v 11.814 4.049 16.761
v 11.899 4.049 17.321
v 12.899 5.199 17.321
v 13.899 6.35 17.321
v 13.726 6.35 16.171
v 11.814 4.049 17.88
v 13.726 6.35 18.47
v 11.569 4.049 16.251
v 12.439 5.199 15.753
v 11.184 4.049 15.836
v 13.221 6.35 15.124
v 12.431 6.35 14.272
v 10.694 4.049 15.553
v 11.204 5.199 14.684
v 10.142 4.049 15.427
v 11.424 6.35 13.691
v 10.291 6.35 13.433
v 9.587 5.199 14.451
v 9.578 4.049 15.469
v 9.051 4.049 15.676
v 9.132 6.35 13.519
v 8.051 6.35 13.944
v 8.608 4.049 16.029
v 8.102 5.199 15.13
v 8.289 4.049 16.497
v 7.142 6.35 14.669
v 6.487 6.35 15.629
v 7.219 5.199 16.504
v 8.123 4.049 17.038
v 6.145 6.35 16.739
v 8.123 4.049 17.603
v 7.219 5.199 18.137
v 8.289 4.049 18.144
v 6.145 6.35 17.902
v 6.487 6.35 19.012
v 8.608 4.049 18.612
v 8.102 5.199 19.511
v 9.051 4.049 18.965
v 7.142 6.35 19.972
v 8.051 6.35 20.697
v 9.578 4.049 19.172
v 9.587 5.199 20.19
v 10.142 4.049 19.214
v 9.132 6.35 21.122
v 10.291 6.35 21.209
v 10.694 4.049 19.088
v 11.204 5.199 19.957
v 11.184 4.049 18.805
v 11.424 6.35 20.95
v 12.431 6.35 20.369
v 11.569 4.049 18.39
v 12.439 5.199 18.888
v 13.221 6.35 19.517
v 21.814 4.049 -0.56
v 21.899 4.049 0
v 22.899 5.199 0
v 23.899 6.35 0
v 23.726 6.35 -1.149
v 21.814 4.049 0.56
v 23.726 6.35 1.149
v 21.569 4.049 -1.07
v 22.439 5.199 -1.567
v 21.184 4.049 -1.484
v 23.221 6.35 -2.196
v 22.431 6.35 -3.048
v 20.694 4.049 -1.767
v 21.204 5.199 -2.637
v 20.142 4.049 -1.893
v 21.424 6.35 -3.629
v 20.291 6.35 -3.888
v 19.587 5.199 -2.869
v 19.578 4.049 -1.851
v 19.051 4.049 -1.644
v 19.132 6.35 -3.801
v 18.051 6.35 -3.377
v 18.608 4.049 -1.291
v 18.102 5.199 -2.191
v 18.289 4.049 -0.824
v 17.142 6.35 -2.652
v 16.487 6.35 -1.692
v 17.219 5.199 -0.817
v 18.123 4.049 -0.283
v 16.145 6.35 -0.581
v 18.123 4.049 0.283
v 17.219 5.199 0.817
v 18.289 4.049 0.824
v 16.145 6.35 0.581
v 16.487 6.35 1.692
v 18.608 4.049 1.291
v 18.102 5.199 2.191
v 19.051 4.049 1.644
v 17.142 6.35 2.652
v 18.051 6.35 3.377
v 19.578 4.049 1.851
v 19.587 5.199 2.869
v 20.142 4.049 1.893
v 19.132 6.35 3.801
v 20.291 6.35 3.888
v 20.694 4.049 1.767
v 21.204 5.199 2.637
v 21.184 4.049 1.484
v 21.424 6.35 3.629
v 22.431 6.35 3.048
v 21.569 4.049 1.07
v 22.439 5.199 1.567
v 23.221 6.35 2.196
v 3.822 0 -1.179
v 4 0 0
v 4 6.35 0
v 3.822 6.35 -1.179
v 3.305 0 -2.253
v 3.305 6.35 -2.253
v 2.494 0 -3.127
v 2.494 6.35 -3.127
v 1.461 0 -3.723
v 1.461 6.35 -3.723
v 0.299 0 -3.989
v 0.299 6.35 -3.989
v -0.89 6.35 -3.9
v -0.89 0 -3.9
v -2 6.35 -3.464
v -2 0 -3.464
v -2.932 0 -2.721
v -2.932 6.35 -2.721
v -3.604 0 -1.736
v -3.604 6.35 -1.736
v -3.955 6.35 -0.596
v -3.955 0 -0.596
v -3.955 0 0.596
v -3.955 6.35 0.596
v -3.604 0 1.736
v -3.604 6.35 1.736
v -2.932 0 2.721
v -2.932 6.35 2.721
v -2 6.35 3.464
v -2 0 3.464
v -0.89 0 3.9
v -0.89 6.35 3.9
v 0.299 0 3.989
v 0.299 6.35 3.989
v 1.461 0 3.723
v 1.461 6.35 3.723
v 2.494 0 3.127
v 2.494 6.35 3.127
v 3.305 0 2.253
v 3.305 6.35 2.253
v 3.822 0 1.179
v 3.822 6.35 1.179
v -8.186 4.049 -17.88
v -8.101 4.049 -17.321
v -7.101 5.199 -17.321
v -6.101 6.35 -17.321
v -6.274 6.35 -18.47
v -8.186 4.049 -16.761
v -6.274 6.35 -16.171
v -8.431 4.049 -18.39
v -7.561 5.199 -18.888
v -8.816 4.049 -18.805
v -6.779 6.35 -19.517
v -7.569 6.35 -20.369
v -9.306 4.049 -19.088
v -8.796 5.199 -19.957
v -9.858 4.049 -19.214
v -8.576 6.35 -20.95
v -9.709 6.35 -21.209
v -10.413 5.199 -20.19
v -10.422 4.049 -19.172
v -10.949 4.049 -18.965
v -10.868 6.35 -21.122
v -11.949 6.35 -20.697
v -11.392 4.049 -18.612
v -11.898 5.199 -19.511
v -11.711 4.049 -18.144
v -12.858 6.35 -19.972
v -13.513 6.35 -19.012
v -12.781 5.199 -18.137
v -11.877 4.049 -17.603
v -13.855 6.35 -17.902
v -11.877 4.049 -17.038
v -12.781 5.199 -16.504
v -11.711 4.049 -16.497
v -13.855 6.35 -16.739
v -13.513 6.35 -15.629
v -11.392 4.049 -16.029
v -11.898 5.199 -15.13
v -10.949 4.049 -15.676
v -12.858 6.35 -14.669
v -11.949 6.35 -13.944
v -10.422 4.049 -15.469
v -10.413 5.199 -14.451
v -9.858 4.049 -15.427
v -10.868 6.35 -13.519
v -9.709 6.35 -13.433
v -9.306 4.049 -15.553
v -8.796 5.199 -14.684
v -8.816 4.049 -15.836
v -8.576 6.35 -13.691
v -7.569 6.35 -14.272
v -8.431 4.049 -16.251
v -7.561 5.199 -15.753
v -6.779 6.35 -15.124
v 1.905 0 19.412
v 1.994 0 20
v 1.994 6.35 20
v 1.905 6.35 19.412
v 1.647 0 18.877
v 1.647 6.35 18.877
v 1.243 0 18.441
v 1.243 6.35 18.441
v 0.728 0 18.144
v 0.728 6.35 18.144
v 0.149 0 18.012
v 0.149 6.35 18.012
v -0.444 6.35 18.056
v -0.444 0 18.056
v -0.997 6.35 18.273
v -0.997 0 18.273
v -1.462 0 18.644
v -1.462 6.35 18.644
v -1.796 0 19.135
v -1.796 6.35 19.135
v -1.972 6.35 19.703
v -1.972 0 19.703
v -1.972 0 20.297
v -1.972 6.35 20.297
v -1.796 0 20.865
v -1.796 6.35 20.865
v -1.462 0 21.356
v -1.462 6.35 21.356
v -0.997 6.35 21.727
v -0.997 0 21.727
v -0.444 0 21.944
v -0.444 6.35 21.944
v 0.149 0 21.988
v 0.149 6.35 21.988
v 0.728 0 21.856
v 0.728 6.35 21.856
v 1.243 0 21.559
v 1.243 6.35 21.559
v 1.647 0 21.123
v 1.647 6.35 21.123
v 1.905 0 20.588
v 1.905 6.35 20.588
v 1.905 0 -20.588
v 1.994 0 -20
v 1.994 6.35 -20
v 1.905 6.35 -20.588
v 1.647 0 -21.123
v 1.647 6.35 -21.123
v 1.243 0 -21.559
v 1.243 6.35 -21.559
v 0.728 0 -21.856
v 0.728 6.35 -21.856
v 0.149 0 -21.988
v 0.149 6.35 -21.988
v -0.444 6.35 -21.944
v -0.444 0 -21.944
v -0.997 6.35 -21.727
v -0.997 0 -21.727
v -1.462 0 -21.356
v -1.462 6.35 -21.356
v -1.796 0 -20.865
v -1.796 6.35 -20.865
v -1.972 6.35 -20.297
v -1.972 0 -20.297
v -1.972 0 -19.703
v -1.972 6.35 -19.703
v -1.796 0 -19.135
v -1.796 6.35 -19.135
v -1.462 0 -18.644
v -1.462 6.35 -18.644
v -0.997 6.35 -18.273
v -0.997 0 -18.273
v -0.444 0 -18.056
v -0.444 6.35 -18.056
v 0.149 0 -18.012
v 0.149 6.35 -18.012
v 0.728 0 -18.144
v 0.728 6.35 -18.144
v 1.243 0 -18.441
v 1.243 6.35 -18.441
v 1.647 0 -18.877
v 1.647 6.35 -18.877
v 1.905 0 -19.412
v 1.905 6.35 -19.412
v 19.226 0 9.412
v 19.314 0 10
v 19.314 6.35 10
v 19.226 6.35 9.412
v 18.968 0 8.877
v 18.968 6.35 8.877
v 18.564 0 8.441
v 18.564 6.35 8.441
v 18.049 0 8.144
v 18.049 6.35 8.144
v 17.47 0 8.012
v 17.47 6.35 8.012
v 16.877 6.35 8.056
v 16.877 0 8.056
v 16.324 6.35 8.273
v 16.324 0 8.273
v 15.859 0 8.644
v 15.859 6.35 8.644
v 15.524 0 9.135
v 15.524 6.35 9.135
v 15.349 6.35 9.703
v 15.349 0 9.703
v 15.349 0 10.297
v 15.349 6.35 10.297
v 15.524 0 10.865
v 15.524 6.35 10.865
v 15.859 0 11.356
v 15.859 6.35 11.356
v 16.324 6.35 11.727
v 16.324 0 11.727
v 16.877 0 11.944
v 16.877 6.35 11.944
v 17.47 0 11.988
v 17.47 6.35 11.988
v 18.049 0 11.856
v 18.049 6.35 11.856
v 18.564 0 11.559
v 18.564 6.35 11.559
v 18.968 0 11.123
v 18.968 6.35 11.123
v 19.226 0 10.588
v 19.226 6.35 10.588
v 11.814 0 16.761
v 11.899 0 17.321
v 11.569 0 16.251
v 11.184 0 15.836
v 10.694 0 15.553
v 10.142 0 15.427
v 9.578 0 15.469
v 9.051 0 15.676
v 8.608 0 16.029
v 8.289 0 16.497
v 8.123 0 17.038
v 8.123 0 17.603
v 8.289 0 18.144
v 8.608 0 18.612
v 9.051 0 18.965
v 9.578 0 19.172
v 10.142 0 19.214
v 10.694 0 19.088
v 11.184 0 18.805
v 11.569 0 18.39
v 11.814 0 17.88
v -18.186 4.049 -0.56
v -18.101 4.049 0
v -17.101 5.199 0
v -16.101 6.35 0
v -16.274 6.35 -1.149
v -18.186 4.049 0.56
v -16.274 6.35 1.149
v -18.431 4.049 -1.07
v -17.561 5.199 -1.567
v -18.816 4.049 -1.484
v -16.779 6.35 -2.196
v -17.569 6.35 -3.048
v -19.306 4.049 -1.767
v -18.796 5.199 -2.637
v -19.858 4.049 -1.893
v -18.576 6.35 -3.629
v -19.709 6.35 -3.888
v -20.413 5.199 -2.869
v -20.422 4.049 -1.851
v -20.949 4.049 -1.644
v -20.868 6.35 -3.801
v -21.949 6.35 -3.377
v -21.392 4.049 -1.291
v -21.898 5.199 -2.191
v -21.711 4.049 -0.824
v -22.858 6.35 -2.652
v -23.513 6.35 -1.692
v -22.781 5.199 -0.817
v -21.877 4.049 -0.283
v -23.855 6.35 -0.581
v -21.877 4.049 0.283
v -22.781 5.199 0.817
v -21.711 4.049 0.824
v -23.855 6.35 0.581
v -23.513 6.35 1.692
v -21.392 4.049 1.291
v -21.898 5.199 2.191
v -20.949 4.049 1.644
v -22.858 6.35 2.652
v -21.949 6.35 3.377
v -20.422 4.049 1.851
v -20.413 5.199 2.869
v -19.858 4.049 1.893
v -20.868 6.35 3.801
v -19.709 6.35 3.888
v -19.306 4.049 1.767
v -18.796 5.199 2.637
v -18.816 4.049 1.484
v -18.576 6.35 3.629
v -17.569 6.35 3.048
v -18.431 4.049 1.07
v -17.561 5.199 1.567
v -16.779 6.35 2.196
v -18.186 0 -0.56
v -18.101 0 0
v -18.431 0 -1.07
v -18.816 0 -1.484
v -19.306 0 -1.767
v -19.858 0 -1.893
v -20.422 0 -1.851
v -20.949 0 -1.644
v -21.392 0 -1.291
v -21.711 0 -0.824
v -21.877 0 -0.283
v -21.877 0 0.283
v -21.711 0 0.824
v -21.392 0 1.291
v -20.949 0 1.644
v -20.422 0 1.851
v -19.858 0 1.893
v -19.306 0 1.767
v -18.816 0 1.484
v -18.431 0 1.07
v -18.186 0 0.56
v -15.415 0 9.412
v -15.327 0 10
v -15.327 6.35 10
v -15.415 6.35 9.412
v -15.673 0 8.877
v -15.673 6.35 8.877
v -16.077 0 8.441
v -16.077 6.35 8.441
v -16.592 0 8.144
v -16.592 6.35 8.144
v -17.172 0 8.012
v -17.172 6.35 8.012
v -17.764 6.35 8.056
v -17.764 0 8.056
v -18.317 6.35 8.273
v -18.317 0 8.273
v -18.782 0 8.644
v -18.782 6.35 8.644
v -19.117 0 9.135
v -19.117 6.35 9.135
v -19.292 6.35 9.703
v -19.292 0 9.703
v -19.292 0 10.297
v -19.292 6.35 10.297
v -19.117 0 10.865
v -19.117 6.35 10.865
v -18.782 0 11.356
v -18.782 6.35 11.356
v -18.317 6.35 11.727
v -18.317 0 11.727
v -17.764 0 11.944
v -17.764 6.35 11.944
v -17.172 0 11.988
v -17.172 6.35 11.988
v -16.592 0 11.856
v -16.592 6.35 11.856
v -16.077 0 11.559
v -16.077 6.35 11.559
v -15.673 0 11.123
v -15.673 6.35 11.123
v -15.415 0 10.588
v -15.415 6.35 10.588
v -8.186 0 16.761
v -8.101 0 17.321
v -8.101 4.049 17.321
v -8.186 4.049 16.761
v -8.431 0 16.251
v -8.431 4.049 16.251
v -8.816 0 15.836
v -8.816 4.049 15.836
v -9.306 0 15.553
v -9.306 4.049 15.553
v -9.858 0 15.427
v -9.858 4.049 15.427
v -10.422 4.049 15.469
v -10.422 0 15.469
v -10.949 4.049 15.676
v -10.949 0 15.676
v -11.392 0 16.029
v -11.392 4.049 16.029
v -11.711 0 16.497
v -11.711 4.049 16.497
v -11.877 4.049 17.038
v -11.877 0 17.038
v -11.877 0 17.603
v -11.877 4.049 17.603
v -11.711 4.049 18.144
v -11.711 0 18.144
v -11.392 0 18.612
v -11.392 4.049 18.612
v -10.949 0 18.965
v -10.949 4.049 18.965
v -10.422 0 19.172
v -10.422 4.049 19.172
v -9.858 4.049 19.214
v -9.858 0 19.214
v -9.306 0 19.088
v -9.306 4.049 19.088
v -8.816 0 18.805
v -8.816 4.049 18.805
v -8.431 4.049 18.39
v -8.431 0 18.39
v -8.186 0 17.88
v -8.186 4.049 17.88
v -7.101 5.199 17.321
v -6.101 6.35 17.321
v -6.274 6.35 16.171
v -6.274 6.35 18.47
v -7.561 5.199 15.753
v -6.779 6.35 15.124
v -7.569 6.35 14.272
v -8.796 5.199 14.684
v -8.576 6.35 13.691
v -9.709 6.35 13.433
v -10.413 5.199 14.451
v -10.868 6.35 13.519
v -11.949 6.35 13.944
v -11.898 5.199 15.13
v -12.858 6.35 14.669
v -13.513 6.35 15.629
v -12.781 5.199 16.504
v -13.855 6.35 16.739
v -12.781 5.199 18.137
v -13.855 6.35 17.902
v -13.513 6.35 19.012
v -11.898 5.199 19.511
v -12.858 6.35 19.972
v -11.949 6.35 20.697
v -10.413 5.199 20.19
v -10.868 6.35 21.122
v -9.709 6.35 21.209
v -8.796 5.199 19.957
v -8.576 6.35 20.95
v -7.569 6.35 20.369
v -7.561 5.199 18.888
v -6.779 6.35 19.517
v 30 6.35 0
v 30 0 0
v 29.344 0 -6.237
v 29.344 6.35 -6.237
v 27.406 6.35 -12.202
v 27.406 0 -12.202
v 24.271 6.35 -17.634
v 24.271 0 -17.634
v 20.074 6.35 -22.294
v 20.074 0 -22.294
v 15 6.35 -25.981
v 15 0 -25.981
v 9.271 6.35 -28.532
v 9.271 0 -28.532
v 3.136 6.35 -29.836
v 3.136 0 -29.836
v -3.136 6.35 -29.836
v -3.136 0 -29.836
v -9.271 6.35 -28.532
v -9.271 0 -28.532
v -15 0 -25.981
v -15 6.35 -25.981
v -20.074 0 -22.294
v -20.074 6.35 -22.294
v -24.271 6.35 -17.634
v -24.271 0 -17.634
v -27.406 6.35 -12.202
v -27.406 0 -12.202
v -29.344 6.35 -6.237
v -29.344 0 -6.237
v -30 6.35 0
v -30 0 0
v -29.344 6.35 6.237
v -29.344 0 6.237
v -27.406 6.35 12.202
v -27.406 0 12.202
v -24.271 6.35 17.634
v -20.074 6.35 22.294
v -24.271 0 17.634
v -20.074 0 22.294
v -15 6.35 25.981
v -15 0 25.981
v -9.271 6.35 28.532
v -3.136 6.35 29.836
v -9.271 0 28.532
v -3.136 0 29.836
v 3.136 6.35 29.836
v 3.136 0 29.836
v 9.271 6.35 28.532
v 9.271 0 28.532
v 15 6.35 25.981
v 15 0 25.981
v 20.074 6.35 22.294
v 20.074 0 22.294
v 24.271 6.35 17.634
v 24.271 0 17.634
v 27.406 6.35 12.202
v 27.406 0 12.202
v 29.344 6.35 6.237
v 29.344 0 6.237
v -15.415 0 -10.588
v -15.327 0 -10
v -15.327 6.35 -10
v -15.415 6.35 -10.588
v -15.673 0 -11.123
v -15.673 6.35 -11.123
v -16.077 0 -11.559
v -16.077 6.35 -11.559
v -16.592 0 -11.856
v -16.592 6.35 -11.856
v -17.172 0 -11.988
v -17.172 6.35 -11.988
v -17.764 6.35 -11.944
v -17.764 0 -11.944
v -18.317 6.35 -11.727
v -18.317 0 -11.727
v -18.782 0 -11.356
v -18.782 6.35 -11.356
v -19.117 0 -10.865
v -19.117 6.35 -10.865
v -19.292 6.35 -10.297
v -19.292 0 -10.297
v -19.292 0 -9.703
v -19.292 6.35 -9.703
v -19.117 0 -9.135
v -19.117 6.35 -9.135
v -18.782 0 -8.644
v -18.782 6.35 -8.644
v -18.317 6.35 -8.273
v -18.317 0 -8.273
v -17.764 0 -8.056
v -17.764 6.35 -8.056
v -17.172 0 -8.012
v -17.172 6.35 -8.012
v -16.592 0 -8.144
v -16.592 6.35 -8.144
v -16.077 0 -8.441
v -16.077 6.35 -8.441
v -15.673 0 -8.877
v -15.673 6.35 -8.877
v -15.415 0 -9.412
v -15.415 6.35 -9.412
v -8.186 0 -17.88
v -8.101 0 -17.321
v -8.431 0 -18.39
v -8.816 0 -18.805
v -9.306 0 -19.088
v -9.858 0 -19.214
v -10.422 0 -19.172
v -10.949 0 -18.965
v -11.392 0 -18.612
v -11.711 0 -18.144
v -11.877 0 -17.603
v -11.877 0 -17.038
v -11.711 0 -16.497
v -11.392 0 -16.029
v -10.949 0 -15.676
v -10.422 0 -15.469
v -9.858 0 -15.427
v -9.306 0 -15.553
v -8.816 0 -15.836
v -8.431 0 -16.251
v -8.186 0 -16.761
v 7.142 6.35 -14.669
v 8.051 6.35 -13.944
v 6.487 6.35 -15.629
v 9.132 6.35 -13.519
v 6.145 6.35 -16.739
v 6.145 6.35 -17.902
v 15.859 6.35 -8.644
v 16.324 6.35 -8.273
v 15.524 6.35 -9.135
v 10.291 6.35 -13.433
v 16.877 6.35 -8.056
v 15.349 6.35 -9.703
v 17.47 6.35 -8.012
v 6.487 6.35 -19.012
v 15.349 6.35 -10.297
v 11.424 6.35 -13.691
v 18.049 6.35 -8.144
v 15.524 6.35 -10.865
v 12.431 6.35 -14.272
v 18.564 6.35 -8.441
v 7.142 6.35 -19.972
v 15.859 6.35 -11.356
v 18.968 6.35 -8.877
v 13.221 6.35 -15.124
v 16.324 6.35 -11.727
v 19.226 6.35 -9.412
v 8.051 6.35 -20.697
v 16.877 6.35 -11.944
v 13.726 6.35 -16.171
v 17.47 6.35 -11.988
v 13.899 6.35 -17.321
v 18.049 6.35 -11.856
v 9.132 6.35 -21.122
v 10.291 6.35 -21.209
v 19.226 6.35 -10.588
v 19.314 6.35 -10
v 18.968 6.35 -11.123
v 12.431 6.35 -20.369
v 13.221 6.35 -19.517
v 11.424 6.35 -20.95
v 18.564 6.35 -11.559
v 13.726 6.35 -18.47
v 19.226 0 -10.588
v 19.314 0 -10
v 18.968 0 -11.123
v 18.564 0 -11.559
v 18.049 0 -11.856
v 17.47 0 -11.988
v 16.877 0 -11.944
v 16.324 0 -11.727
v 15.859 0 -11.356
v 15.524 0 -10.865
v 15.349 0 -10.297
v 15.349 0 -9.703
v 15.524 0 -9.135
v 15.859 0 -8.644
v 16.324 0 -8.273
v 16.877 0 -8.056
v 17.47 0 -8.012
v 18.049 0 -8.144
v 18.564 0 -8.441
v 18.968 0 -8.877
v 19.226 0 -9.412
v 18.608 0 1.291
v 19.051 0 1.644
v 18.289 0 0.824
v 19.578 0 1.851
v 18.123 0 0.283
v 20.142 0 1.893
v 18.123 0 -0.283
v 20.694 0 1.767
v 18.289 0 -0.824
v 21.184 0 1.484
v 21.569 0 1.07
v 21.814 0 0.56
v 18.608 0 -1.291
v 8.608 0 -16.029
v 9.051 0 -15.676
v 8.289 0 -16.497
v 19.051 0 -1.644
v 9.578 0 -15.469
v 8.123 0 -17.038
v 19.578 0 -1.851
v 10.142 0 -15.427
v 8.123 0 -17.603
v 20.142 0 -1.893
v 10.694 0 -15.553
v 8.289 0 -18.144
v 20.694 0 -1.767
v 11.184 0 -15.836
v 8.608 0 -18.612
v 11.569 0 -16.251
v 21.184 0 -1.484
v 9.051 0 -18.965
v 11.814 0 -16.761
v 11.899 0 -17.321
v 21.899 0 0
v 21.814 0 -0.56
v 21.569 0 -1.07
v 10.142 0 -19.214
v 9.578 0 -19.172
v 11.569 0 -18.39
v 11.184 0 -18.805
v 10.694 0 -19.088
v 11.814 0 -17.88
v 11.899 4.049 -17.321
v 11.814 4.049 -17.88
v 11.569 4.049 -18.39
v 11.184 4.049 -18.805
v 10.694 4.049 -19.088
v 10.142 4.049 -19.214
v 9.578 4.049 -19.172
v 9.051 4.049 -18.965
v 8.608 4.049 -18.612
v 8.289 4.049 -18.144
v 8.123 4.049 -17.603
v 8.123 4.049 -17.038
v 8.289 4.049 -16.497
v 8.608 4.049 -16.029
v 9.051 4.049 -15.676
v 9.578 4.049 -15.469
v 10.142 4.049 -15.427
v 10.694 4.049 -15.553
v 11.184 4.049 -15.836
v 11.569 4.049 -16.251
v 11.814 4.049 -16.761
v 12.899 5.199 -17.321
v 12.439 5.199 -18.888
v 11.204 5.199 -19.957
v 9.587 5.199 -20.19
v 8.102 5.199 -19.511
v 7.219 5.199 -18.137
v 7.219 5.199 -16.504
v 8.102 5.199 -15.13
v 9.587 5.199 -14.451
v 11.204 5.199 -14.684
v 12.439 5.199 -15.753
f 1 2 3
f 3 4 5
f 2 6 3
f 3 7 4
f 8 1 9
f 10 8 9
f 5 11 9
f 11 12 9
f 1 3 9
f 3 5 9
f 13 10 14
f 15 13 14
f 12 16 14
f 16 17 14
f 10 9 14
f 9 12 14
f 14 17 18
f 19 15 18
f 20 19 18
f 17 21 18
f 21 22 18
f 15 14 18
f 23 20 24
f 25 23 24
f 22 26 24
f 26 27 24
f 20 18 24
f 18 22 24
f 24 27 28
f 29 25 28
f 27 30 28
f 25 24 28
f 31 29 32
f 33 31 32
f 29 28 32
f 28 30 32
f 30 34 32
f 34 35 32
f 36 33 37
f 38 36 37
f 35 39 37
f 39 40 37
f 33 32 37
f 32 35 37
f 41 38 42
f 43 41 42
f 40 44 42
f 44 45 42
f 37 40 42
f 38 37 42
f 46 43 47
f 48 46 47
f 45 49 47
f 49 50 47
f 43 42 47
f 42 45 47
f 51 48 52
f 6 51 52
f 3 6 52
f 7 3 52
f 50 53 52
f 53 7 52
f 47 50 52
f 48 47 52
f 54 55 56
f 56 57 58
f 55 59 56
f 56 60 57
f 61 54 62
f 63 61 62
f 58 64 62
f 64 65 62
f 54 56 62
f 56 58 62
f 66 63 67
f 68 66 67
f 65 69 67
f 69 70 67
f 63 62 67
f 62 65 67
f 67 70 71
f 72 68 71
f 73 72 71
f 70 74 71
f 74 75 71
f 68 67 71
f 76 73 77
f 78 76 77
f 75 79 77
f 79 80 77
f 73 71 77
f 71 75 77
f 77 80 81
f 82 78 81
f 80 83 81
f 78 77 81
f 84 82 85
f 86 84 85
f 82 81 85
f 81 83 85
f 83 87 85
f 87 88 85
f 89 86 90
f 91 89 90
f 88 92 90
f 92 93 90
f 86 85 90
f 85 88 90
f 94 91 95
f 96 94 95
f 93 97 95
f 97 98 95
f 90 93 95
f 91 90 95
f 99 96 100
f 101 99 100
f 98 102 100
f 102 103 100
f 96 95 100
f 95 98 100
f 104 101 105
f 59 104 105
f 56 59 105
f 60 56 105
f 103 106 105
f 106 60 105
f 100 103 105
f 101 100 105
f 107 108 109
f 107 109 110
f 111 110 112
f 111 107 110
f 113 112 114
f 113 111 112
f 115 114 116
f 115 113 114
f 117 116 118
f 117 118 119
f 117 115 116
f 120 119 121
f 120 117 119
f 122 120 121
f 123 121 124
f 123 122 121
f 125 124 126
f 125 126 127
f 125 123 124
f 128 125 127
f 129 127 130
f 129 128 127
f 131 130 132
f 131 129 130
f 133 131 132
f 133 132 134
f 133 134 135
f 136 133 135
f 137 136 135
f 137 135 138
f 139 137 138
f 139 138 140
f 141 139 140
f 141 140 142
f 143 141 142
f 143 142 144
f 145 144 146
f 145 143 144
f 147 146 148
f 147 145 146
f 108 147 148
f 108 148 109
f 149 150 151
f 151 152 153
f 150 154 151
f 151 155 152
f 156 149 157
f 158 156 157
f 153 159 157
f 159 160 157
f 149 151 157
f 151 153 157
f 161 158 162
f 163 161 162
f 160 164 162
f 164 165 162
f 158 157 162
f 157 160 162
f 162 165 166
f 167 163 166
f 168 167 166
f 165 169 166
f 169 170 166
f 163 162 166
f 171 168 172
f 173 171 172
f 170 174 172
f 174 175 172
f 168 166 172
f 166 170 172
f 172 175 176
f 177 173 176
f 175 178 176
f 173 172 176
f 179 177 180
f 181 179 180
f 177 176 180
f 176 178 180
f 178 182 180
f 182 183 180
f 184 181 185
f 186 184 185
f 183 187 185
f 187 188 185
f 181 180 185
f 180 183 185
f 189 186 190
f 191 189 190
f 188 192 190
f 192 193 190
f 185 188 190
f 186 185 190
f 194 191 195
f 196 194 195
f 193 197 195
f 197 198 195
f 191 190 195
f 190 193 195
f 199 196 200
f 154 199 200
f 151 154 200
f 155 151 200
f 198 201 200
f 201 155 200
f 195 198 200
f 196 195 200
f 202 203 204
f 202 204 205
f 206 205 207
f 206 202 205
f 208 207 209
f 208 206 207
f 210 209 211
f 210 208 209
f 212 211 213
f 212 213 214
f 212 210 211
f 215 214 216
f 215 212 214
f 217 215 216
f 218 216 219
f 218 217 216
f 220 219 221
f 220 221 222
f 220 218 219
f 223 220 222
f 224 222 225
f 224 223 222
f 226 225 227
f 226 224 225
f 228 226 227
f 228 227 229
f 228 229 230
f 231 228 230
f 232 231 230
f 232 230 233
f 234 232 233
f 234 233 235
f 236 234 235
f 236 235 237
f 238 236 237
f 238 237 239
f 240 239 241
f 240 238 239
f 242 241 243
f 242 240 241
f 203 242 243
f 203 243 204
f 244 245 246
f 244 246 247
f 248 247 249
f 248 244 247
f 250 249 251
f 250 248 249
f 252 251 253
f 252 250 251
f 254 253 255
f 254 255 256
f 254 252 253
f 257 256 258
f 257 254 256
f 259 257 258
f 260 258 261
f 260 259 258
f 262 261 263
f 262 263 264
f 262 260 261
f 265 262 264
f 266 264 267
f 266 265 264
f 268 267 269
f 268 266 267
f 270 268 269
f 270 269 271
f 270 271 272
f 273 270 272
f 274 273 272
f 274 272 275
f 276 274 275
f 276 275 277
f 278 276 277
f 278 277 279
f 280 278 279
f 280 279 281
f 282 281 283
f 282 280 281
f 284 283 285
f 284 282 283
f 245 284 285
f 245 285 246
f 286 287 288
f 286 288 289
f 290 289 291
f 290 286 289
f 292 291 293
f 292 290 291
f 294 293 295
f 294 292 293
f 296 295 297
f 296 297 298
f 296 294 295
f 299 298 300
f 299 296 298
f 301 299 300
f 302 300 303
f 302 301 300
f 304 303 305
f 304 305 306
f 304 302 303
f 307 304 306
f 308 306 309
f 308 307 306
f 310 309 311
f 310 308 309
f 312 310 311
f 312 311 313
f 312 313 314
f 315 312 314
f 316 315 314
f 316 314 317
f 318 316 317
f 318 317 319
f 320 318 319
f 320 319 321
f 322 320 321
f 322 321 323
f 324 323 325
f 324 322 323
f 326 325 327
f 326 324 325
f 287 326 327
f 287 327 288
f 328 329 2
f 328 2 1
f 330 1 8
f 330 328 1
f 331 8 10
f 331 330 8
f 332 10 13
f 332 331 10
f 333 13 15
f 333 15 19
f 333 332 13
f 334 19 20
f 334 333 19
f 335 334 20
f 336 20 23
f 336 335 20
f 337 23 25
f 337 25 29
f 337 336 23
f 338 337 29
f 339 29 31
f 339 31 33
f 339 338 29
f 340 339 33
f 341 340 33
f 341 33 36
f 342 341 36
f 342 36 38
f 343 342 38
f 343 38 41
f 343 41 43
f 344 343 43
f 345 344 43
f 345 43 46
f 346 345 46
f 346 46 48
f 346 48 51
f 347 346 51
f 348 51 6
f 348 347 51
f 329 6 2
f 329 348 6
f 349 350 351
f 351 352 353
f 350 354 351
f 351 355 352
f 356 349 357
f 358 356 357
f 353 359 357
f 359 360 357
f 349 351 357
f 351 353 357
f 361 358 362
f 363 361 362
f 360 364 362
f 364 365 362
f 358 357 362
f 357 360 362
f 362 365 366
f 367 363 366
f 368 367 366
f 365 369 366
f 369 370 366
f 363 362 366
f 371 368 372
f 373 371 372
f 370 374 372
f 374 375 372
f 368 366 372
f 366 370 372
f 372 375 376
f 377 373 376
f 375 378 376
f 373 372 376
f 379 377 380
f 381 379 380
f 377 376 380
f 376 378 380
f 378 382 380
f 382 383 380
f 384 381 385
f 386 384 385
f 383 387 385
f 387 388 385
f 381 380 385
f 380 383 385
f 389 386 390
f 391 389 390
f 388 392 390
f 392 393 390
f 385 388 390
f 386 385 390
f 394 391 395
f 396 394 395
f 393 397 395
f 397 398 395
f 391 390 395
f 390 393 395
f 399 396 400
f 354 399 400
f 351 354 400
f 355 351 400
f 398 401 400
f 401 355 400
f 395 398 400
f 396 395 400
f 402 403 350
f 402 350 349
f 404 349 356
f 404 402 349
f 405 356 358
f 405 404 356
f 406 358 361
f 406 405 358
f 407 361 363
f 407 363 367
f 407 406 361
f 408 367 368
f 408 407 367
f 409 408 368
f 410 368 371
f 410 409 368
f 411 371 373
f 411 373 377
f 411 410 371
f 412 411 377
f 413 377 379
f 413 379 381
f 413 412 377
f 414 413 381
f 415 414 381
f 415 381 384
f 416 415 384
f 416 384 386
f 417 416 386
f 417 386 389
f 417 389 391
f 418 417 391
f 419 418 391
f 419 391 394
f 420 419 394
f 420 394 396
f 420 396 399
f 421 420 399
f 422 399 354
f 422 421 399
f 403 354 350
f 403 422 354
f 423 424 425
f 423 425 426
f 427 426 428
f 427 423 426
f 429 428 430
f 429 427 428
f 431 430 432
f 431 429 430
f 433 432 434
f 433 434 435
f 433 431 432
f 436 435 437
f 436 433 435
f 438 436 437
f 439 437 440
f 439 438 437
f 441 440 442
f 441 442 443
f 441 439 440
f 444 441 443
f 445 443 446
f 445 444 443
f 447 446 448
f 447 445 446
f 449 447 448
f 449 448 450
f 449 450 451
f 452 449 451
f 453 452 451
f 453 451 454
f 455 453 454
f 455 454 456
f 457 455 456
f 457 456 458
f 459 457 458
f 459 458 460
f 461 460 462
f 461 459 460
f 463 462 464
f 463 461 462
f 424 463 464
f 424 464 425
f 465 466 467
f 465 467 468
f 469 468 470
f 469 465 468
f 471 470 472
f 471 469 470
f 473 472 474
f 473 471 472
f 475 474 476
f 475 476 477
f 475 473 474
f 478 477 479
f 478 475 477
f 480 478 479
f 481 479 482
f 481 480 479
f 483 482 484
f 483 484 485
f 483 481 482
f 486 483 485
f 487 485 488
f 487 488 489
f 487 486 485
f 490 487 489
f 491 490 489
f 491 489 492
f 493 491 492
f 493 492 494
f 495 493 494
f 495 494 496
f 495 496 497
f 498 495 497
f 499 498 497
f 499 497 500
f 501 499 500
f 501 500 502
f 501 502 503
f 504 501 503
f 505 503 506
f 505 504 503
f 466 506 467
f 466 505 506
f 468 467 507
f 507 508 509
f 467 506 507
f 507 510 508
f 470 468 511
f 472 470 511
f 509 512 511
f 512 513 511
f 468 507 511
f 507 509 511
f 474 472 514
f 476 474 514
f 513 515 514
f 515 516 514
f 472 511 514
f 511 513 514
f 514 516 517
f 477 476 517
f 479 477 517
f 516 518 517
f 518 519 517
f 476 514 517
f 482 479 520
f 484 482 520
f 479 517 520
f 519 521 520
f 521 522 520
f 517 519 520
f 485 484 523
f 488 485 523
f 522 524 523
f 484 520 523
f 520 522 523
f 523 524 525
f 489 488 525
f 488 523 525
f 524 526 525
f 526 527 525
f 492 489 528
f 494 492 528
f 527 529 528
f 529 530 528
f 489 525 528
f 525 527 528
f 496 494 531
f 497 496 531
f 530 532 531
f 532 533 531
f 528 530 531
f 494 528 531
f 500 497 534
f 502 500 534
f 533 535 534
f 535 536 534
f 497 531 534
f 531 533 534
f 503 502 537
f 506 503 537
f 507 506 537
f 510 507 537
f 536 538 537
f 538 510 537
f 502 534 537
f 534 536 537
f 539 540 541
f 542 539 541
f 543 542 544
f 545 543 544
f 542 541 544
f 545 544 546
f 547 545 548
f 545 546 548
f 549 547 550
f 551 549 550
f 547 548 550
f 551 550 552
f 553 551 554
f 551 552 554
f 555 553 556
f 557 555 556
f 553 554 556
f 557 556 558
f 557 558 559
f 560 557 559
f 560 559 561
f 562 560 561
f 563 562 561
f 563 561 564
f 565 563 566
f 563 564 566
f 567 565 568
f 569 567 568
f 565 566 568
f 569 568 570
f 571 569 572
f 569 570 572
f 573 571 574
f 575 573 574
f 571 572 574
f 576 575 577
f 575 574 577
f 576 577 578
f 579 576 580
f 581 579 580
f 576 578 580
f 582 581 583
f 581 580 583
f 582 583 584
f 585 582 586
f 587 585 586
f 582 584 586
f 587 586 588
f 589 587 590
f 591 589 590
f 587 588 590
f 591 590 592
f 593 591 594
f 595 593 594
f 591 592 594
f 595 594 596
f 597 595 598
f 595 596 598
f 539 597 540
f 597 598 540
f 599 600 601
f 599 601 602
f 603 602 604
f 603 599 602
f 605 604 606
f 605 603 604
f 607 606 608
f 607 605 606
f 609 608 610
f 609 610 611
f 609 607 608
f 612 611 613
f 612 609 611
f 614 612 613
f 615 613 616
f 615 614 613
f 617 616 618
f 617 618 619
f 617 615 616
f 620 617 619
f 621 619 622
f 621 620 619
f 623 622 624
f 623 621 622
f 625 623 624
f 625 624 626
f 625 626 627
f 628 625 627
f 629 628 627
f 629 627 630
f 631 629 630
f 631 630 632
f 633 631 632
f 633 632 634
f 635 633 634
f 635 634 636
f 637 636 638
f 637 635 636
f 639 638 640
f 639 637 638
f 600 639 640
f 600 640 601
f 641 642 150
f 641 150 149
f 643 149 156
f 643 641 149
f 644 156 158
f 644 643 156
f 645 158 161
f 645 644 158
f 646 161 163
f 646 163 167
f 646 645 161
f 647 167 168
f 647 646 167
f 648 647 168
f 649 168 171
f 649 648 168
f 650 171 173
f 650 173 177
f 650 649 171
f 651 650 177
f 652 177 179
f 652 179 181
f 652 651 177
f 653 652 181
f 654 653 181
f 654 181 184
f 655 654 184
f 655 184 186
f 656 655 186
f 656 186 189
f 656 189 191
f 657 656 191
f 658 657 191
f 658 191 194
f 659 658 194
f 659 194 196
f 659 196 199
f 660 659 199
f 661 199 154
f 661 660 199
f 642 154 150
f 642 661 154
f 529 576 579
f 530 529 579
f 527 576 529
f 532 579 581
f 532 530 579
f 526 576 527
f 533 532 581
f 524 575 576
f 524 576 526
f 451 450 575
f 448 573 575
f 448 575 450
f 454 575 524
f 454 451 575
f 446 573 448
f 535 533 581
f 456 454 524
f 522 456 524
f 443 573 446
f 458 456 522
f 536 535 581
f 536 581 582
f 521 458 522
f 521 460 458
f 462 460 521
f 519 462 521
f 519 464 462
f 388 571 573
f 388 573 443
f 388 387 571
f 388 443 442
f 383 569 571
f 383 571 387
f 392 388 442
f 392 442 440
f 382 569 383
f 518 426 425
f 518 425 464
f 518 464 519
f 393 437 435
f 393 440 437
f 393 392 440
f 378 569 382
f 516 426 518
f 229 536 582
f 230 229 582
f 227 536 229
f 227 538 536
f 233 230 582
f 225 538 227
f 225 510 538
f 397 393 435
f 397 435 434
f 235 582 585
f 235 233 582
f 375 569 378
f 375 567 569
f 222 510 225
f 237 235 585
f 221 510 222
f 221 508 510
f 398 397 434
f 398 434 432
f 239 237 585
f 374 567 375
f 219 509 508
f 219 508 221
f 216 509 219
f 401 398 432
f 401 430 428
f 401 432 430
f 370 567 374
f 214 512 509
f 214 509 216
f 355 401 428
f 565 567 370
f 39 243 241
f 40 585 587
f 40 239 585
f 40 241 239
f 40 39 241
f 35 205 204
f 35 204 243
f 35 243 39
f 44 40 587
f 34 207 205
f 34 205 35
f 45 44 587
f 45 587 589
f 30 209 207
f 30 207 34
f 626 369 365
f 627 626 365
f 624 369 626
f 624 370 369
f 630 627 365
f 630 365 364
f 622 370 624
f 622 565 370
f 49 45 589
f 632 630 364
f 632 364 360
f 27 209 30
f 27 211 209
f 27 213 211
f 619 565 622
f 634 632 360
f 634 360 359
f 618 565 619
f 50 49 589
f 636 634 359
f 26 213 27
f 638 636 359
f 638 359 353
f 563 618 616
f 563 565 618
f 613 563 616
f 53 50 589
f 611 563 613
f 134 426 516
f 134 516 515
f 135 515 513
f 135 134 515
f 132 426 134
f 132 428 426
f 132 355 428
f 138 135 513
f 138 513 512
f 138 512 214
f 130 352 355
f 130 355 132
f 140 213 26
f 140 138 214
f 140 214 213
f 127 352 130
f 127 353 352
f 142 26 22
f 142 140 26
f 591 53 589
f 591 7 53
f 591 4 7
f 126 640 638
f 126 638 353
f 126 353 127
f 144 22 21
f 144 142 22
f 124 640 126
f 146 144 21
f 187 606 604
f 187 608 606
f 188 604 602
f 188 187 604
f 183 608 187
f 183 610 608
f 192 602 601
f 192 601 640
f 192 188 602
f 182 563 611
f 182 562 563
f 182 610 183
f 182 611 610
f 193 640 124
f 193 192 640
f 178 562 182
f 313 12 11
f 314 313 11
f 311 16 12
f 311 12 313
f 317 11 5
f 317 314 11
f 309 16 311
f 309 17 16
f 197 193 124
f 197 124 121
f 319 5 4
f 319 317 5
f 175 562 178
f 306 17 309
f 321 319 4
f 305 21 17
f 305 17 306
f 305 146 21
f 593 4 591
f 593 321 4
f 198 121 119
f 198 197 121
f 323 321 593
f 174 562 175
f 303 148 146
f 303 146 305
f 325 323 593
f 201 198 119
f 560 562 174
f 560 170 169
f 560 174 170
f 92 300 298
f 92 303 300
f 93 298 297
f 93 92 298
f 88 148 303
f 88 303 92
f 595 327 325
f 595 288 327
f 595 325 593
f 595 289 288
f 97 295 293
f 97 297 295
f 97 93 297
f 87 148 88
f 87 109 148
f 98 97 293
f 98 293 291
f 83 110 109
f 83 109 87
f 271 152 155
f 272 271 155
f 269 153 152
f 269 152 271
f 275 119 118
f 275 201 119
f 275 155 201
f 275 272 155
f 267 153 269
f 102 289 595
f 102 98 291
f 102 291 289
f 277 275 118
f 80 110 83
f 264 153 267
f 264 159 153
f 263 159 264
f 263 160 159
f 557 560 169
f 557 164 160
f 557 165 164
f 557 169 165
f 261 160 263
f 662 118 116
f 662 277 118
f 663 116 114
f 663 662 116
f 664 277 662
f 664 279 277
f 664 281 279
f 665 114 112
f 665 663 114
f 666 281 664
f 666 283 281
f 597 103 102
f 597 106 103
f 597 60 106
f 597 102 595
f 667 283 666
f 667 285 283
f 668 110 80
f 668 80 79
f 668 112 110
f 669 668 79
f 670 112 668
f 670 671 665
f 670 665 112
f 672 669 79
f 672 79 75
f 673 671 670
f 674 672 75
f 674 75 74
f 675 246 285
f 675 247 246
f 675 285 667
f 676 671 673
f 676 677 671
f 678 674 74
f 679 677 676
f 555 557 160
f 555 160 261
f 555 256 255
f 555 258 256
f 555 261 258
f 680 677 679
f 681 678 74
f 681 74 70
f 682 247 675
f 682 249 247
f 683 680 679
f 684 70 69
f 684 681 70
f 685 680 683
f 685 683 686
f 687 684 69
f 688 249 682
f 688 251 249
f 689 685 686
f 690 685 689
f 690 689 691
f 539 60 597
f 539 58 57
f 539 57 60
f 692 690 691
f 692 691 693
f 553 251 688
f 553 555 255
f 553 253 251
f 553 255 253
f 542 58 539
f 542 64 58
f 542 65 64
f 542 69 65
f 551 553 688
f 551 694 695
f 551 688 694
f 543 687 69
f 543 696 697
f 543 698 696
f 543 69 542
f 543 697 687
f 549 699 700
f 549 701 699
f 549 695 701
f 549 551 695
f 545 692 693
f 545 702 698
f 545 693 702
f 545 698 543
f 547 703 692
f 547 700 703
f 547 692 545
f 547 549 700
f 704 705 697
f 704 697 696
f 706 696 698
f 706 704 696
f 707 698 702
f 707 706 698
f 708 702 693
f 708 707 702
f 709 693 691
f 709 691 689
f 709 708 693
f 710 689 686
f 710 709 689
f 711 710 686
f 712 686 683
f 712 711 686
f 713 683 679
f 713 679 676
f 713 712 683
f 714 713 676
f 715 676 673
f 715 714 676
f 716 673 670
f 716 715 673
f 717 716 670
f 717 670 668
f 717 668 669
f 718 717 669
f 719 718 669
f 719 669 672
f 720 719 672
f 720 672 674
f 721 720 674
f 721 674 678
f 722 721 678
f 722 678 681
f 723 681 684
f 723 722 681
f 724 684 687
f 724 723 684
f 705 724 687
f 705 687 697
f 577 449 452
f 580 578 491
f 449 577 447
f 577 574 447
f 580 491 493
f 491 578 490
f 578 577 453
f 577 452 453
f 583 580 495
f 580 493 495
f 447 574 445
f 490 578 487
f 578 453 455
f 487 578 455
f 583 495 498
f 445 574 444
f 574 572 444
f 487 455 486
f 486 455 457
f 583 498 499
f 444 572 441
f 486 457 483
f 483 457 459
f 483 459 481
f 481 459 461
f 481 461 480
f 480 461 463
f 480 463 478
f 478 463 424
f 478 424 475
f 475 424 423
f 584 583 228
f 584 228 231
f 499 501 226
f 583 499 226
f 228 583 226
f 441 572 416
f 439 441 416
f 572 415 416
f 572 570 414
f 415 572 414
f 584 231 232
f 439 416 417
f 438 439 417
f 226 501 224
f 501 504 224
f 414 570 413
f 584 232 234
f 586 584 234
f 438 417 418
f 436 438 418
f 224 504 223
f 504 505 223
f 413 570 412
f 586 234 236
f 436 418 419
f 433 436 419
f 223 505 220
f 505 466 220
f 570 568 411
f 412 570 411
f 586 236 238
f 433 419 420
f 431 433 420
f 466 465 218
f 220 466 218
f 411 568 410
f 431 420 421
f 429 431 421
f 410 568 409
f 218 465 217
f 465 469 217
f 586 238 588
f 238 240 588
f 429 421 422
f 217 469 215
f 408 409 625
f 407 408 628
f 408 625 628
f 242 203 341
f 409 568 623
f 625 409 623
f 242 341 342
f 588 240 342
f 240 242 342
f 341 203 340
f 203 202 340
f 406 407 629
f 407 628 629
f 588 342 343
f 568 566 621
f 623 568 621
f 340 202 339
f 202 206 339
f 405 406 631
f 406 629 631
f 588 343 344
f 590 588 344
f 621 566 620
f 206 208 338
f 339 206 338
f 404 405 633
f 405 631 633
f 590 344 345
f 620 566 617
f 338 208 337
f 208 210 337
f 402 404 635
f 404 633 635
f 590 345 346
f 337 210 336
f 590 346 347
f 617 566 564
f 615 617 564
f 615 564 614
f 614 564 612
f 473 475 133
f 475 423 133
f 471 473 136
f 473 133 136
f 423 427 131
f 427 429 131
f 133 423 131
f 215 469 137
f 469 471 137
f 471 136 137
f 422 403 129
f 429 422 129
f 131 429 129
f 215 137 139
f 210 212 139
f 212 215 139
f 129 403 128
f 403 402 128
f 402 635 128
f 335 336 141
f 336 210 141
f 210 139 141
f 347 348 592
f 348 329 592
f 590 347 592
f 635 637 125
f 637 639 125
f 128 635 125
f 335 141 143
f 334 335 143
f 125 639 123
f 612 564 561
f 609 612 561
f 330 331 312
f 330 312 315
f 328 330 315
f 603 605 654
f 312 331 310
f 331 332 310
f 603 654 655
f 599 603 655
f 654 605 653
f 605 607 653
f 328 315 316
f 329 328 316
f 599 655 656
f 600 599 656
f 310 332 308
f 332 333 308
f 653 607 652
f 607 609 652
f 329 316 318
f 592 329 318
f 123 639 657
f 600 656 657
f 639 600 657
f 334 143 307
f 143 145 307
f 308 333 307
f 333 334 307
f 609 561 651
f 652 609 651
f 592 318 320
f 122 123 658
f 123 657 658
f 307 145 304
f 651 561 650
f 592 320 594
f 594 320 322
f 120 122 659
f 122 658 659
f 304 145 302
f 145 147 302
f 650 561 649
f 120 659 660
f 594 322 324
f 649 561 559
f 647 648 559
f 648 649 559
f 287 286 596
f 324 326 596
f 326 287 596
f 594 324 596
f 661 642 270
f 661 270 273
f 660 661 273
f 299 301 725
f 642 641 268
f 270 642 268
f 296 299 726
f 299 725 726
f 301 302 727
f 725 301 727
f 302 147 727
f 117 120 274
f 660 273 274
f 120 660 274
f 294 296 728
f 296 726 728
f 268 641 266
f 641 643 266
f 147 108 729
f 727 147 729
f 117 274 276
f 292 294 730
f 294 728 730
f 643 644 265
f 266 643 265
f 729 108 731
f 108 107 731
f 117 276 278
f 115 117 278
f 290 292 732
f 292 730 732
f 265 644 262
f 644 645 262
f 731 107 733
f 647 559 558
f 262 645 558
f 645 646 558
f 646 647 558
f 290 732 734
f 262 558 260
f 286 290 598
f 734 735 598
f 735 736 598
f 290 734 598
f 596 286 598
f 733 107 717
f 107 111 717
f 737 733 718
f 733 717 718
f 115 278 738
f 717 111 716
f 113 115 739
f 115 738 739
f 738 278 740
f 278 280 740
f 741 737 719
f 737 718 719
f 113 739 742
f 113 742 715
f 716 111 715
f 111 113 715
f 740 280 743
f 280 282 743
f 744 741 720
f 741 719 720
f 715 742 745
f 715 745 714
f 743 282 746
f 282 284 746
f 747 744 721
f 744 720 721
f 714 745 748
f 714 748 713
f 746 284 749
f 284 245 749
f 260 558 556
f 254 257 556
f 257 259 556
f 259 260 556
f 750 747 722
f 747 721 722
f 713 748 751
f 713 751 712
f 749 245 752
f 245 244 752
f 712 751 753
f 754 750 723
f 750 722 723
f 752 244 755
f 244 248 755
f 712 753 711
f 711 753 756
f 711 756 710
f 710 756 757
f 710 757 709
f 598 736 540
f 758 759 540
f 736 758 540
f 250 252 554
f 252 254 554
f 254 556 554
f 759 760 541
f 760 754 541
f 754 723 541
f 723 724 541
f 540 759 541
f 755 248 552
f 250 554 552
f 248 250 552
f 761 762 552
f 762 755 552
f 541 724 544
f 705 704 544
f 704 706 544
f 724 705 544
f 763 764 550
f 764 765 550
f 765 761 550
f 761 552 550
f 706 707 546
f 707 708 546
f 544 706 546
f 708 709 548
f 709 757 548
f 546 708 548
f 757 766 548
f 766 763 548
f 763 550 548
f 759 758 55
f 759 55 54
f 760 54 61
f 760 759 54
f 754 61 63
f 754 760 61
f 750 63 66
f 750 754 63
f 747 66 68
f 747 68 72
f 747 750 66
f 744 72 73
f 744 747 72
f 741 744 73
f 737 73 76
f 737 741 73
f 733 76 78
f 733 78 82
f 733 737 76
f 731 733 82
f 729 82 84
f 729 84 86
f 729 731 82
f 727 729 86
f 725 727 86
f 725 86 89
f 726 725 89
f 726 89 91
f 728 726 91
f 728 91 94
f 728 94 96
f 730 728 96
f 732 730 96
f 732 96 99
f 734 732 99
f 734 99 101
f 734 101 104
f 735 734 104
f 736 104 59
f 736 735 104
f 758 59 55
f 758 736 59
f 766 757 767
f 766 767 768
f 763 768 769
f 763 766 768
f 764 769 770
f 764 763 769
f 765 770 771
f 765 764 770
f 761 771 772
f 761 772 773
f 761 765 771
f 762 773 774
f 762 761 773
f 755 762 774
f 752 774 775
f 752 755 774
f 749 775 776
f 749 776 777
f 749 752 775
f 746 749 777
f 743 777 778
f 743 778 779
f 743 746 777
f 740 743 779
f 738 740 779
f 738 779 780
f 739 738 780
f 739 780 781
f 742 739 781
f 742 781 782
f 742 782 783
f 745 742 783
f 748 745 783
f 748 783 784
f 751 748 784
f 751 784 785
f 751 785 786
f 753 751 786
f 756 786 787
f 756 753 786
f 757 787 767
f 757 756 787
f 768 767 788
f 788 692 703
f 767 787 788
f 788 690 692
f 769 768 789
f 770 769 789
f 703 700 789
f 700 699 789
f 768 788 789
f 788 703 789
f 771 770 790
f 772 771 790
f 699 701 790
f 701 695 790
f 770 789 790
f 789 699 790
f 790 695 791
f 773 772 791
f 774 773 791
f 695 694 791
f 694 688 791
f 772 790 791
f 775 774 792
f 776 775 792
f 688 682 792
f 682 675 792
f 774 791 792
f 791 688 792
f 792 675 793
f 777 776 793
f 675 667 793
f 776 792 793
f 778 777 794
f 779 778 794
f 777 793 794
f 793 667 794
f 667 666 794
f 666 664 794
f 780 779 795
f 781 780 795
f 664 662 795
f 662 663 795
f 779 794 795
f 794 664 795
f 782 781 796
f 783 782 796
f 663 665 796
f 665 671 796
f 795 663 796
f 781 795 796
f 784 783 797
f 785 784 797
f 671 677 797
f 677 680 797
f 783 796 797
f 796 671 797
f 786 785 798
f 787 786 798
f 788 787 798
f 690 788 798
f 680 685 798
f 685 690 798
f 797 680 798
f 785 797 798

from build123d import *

# Parameters (mm, degrees)
SKETCH1_R             = 30
SKETCH1_R_2           = 1.89865
SKETCH1_R_3           = 1.9939
SKETCH1_R_4           = 4
BOSS_EXTRUDE1_DEPTH   = 6.35
CHAMFER1_SIZE         = 2.301024407
CHAMFER1_SIZE2        = 2.00025
CHAMFER1_PART_2_SIZE  = 2.301024407
CHAMFER1_PART_2_SIZE2 = 2.00025
CHAMFER1_PART_3_SIZE  = 2.301024407
CHAMFER1_PART_3_SIZE2 = 2.00025
CHAMFER1_PART_4_SIZE  = 2.301024407
CHAMFER1_PART_4_SIZE2 = 2.00025
CHAMFER1_PART_5_SIZE  = 2.301024407
CHAMFER1_PART_5_SIZE2 = 2.00025
CHAMFER1_PART_6_SIZE  = 2.301024407
CHAMFER1_PART_6_SIZE2 = 2.00025


with BuildPart() as part:
    # Sketch1 → Boss-Extrude1 (new body)
    with BuildSketch(Plane(origin=(0, 0, 0), x_dir=(1, 0, 0), z_dir=(0, 1, 0))):
        Circle(SKETCH1_R)
        with Locations((20, 0)):
            Circle(SKETCH1_R_2, mode=Mode.SUBTRACT)
        with Locations((10, -17.320508076)):
            Circle(SKETCH1_R_2, mode=Mode.SUBTRACT)
        with Locations((-10, -17.320508076)):
            Circle(SKETCH1_R_2, mode=Mode.SUBTRACT)
        with Locations((-20, 0)):
            Circle(SKETCH1_R_2, mode=Mode.SUBTRACT)
        with Locations((-10, 17.320508076)):
            Circle(SKETCH1_R_2, mode=Mode.SUBTRACT)
        with Locations((10, 17.320508076)):
            Circle(SKETCH1_R_2, mode=Mode.SUBTRACT)
        with Locations((0, 20)):
            Circle(SKETCH1_R_3, mode=Mode.SUBTRACT)
        with Locations((17.320508076, 10)):
            Circle(SKETCH1_R_3, mode=Mode.SUBTRACT)
        with Locations((17.320508076, -10)):
            Circle(SKETCH1_R_3, mode=Mode.SUBTRACT)
        with Locations((0, -20)):
            Circle(SKETCH1_R_3, mode=Mode.SUBTRACT)
        with Locations((-17.320508076, -10)):
            Circle(SKETCH1_R_3, mode=Mode.SUBTRACT)
        with Locations((-17.320508076, 10)):
            Circle(SKETCH1_R_3, mode=Mode.SUBTRACT)
        Circle(SKETCH1_R_4, mode=Mode.SUBTRACT)
    extrude(amount=BOSS_EXTRUDE1_DEPTH)

    # Chamfer1
    chamfer1_edges = [part.edges().sort_by_distance(p)[0] for p in [
        (8.10135, 6.35, 17.320508076),
    ]]
    chamfer1_side = [part.faces().sort_by_distance(p)[0] for p in [
        (8.10135, 3.175, 17.320508076),
    ]]
    chamfer(chamfer1_edges, length=CHAMFER1_SIZE, length2=CHAMFER1_SIZE2, reference=chamfer1_side[0])

    # Chamfer1 part 2
    chamfer1_part_2_edges = [part.edges().sort_by_distance(p)[0] for p in [
        (-11.89865, 6.35, 17.320508076),
    ]]
    chamfer1_part_2_side = [part.faces().sort_by_distance(p)[0] for p in [
        (-11.89865, 3.175, 17.320508076),
    ]]
    chamfer(chamfer1_part_2_edges, length=CHAMFER1_PART_2_SIZE, length2=CHAMFER1_PART_2_SIZE2, reference=chamfer1_part_2_side[0])

    # Chamfer1 part 3
    chamfer1_part_3_edges = [part.edges().sort_by_distance(p)[0] for p in [
        (-21.89865, 6.35, 0),
    ]]
    chamfer1_part_3_side = [part.faces().sort_by_distance(p)[0] for p in [
        (-21.89865, 3.175, 0),
    ]]
    chamfer(chamfer1_part_3_edges, length=CHAMFER1_PART_3_SIZE, length2=CHAMFER1_PART_3_SIZE2, reference=chamfer1_part_3_side[0])

    # Chamfer1 part 4
    chamfer1_part_4_edges = [part.edges().sort_by_distance(p)[0] for p in [
        (-11.89865, 6.35, -17.320508076),
    ]]
    chamfer1_part_4_side = [part.faces().sort_by_distance(p)[0] for p in [
        (-11.89865, 3.175, -17.320508076),
    ]]
    chamfer(chamfer1_part_4_edges, length=CHAMFER1_PART_4_SIZE, length2=CHAMFER1_PART_4_SIZE2, reference=chamfer1_part_4_side[0])

    # Chamfer1 part 5
    chamfer1_part_5_edges = [part.edges().sort_by_distance(p)[0] for p in [
        (8.10135, 6.35, -17.320508076),
    ]]
    chamfer1_part_5_side = [part.faces().sort_by_distance(p)[0] for p in [
        (8.10135, 3.175, -17.320508076),
    ]]
    chamfer(chamfer1_part_5_edges, length=CHAMFER1_PART_5_SIZE, length2=CHAMFER1_PART_5_SIZE2, reference=chamfer1_part_5_side[0])

    # Chamfer1 part 6
    chamfer1_part_6_edges = [part.edges().sort_by_distance(p)[0] for p in [
        (18.10135, 6.35, 0),
    ]]
    chamfer1_part_6_side = [part.faces().sort_by_distance(p)[0] for p in [
        (18.10135, 3.175, 0),
    ]]
    chamfer(chamfer1_part_6_edges, length=CHAMFER1_PART_6_SIZE, length2=CHAMFER1_PART_6_SIZE2, reference=chamfer1_part_6_side[0])


solid = part.part
